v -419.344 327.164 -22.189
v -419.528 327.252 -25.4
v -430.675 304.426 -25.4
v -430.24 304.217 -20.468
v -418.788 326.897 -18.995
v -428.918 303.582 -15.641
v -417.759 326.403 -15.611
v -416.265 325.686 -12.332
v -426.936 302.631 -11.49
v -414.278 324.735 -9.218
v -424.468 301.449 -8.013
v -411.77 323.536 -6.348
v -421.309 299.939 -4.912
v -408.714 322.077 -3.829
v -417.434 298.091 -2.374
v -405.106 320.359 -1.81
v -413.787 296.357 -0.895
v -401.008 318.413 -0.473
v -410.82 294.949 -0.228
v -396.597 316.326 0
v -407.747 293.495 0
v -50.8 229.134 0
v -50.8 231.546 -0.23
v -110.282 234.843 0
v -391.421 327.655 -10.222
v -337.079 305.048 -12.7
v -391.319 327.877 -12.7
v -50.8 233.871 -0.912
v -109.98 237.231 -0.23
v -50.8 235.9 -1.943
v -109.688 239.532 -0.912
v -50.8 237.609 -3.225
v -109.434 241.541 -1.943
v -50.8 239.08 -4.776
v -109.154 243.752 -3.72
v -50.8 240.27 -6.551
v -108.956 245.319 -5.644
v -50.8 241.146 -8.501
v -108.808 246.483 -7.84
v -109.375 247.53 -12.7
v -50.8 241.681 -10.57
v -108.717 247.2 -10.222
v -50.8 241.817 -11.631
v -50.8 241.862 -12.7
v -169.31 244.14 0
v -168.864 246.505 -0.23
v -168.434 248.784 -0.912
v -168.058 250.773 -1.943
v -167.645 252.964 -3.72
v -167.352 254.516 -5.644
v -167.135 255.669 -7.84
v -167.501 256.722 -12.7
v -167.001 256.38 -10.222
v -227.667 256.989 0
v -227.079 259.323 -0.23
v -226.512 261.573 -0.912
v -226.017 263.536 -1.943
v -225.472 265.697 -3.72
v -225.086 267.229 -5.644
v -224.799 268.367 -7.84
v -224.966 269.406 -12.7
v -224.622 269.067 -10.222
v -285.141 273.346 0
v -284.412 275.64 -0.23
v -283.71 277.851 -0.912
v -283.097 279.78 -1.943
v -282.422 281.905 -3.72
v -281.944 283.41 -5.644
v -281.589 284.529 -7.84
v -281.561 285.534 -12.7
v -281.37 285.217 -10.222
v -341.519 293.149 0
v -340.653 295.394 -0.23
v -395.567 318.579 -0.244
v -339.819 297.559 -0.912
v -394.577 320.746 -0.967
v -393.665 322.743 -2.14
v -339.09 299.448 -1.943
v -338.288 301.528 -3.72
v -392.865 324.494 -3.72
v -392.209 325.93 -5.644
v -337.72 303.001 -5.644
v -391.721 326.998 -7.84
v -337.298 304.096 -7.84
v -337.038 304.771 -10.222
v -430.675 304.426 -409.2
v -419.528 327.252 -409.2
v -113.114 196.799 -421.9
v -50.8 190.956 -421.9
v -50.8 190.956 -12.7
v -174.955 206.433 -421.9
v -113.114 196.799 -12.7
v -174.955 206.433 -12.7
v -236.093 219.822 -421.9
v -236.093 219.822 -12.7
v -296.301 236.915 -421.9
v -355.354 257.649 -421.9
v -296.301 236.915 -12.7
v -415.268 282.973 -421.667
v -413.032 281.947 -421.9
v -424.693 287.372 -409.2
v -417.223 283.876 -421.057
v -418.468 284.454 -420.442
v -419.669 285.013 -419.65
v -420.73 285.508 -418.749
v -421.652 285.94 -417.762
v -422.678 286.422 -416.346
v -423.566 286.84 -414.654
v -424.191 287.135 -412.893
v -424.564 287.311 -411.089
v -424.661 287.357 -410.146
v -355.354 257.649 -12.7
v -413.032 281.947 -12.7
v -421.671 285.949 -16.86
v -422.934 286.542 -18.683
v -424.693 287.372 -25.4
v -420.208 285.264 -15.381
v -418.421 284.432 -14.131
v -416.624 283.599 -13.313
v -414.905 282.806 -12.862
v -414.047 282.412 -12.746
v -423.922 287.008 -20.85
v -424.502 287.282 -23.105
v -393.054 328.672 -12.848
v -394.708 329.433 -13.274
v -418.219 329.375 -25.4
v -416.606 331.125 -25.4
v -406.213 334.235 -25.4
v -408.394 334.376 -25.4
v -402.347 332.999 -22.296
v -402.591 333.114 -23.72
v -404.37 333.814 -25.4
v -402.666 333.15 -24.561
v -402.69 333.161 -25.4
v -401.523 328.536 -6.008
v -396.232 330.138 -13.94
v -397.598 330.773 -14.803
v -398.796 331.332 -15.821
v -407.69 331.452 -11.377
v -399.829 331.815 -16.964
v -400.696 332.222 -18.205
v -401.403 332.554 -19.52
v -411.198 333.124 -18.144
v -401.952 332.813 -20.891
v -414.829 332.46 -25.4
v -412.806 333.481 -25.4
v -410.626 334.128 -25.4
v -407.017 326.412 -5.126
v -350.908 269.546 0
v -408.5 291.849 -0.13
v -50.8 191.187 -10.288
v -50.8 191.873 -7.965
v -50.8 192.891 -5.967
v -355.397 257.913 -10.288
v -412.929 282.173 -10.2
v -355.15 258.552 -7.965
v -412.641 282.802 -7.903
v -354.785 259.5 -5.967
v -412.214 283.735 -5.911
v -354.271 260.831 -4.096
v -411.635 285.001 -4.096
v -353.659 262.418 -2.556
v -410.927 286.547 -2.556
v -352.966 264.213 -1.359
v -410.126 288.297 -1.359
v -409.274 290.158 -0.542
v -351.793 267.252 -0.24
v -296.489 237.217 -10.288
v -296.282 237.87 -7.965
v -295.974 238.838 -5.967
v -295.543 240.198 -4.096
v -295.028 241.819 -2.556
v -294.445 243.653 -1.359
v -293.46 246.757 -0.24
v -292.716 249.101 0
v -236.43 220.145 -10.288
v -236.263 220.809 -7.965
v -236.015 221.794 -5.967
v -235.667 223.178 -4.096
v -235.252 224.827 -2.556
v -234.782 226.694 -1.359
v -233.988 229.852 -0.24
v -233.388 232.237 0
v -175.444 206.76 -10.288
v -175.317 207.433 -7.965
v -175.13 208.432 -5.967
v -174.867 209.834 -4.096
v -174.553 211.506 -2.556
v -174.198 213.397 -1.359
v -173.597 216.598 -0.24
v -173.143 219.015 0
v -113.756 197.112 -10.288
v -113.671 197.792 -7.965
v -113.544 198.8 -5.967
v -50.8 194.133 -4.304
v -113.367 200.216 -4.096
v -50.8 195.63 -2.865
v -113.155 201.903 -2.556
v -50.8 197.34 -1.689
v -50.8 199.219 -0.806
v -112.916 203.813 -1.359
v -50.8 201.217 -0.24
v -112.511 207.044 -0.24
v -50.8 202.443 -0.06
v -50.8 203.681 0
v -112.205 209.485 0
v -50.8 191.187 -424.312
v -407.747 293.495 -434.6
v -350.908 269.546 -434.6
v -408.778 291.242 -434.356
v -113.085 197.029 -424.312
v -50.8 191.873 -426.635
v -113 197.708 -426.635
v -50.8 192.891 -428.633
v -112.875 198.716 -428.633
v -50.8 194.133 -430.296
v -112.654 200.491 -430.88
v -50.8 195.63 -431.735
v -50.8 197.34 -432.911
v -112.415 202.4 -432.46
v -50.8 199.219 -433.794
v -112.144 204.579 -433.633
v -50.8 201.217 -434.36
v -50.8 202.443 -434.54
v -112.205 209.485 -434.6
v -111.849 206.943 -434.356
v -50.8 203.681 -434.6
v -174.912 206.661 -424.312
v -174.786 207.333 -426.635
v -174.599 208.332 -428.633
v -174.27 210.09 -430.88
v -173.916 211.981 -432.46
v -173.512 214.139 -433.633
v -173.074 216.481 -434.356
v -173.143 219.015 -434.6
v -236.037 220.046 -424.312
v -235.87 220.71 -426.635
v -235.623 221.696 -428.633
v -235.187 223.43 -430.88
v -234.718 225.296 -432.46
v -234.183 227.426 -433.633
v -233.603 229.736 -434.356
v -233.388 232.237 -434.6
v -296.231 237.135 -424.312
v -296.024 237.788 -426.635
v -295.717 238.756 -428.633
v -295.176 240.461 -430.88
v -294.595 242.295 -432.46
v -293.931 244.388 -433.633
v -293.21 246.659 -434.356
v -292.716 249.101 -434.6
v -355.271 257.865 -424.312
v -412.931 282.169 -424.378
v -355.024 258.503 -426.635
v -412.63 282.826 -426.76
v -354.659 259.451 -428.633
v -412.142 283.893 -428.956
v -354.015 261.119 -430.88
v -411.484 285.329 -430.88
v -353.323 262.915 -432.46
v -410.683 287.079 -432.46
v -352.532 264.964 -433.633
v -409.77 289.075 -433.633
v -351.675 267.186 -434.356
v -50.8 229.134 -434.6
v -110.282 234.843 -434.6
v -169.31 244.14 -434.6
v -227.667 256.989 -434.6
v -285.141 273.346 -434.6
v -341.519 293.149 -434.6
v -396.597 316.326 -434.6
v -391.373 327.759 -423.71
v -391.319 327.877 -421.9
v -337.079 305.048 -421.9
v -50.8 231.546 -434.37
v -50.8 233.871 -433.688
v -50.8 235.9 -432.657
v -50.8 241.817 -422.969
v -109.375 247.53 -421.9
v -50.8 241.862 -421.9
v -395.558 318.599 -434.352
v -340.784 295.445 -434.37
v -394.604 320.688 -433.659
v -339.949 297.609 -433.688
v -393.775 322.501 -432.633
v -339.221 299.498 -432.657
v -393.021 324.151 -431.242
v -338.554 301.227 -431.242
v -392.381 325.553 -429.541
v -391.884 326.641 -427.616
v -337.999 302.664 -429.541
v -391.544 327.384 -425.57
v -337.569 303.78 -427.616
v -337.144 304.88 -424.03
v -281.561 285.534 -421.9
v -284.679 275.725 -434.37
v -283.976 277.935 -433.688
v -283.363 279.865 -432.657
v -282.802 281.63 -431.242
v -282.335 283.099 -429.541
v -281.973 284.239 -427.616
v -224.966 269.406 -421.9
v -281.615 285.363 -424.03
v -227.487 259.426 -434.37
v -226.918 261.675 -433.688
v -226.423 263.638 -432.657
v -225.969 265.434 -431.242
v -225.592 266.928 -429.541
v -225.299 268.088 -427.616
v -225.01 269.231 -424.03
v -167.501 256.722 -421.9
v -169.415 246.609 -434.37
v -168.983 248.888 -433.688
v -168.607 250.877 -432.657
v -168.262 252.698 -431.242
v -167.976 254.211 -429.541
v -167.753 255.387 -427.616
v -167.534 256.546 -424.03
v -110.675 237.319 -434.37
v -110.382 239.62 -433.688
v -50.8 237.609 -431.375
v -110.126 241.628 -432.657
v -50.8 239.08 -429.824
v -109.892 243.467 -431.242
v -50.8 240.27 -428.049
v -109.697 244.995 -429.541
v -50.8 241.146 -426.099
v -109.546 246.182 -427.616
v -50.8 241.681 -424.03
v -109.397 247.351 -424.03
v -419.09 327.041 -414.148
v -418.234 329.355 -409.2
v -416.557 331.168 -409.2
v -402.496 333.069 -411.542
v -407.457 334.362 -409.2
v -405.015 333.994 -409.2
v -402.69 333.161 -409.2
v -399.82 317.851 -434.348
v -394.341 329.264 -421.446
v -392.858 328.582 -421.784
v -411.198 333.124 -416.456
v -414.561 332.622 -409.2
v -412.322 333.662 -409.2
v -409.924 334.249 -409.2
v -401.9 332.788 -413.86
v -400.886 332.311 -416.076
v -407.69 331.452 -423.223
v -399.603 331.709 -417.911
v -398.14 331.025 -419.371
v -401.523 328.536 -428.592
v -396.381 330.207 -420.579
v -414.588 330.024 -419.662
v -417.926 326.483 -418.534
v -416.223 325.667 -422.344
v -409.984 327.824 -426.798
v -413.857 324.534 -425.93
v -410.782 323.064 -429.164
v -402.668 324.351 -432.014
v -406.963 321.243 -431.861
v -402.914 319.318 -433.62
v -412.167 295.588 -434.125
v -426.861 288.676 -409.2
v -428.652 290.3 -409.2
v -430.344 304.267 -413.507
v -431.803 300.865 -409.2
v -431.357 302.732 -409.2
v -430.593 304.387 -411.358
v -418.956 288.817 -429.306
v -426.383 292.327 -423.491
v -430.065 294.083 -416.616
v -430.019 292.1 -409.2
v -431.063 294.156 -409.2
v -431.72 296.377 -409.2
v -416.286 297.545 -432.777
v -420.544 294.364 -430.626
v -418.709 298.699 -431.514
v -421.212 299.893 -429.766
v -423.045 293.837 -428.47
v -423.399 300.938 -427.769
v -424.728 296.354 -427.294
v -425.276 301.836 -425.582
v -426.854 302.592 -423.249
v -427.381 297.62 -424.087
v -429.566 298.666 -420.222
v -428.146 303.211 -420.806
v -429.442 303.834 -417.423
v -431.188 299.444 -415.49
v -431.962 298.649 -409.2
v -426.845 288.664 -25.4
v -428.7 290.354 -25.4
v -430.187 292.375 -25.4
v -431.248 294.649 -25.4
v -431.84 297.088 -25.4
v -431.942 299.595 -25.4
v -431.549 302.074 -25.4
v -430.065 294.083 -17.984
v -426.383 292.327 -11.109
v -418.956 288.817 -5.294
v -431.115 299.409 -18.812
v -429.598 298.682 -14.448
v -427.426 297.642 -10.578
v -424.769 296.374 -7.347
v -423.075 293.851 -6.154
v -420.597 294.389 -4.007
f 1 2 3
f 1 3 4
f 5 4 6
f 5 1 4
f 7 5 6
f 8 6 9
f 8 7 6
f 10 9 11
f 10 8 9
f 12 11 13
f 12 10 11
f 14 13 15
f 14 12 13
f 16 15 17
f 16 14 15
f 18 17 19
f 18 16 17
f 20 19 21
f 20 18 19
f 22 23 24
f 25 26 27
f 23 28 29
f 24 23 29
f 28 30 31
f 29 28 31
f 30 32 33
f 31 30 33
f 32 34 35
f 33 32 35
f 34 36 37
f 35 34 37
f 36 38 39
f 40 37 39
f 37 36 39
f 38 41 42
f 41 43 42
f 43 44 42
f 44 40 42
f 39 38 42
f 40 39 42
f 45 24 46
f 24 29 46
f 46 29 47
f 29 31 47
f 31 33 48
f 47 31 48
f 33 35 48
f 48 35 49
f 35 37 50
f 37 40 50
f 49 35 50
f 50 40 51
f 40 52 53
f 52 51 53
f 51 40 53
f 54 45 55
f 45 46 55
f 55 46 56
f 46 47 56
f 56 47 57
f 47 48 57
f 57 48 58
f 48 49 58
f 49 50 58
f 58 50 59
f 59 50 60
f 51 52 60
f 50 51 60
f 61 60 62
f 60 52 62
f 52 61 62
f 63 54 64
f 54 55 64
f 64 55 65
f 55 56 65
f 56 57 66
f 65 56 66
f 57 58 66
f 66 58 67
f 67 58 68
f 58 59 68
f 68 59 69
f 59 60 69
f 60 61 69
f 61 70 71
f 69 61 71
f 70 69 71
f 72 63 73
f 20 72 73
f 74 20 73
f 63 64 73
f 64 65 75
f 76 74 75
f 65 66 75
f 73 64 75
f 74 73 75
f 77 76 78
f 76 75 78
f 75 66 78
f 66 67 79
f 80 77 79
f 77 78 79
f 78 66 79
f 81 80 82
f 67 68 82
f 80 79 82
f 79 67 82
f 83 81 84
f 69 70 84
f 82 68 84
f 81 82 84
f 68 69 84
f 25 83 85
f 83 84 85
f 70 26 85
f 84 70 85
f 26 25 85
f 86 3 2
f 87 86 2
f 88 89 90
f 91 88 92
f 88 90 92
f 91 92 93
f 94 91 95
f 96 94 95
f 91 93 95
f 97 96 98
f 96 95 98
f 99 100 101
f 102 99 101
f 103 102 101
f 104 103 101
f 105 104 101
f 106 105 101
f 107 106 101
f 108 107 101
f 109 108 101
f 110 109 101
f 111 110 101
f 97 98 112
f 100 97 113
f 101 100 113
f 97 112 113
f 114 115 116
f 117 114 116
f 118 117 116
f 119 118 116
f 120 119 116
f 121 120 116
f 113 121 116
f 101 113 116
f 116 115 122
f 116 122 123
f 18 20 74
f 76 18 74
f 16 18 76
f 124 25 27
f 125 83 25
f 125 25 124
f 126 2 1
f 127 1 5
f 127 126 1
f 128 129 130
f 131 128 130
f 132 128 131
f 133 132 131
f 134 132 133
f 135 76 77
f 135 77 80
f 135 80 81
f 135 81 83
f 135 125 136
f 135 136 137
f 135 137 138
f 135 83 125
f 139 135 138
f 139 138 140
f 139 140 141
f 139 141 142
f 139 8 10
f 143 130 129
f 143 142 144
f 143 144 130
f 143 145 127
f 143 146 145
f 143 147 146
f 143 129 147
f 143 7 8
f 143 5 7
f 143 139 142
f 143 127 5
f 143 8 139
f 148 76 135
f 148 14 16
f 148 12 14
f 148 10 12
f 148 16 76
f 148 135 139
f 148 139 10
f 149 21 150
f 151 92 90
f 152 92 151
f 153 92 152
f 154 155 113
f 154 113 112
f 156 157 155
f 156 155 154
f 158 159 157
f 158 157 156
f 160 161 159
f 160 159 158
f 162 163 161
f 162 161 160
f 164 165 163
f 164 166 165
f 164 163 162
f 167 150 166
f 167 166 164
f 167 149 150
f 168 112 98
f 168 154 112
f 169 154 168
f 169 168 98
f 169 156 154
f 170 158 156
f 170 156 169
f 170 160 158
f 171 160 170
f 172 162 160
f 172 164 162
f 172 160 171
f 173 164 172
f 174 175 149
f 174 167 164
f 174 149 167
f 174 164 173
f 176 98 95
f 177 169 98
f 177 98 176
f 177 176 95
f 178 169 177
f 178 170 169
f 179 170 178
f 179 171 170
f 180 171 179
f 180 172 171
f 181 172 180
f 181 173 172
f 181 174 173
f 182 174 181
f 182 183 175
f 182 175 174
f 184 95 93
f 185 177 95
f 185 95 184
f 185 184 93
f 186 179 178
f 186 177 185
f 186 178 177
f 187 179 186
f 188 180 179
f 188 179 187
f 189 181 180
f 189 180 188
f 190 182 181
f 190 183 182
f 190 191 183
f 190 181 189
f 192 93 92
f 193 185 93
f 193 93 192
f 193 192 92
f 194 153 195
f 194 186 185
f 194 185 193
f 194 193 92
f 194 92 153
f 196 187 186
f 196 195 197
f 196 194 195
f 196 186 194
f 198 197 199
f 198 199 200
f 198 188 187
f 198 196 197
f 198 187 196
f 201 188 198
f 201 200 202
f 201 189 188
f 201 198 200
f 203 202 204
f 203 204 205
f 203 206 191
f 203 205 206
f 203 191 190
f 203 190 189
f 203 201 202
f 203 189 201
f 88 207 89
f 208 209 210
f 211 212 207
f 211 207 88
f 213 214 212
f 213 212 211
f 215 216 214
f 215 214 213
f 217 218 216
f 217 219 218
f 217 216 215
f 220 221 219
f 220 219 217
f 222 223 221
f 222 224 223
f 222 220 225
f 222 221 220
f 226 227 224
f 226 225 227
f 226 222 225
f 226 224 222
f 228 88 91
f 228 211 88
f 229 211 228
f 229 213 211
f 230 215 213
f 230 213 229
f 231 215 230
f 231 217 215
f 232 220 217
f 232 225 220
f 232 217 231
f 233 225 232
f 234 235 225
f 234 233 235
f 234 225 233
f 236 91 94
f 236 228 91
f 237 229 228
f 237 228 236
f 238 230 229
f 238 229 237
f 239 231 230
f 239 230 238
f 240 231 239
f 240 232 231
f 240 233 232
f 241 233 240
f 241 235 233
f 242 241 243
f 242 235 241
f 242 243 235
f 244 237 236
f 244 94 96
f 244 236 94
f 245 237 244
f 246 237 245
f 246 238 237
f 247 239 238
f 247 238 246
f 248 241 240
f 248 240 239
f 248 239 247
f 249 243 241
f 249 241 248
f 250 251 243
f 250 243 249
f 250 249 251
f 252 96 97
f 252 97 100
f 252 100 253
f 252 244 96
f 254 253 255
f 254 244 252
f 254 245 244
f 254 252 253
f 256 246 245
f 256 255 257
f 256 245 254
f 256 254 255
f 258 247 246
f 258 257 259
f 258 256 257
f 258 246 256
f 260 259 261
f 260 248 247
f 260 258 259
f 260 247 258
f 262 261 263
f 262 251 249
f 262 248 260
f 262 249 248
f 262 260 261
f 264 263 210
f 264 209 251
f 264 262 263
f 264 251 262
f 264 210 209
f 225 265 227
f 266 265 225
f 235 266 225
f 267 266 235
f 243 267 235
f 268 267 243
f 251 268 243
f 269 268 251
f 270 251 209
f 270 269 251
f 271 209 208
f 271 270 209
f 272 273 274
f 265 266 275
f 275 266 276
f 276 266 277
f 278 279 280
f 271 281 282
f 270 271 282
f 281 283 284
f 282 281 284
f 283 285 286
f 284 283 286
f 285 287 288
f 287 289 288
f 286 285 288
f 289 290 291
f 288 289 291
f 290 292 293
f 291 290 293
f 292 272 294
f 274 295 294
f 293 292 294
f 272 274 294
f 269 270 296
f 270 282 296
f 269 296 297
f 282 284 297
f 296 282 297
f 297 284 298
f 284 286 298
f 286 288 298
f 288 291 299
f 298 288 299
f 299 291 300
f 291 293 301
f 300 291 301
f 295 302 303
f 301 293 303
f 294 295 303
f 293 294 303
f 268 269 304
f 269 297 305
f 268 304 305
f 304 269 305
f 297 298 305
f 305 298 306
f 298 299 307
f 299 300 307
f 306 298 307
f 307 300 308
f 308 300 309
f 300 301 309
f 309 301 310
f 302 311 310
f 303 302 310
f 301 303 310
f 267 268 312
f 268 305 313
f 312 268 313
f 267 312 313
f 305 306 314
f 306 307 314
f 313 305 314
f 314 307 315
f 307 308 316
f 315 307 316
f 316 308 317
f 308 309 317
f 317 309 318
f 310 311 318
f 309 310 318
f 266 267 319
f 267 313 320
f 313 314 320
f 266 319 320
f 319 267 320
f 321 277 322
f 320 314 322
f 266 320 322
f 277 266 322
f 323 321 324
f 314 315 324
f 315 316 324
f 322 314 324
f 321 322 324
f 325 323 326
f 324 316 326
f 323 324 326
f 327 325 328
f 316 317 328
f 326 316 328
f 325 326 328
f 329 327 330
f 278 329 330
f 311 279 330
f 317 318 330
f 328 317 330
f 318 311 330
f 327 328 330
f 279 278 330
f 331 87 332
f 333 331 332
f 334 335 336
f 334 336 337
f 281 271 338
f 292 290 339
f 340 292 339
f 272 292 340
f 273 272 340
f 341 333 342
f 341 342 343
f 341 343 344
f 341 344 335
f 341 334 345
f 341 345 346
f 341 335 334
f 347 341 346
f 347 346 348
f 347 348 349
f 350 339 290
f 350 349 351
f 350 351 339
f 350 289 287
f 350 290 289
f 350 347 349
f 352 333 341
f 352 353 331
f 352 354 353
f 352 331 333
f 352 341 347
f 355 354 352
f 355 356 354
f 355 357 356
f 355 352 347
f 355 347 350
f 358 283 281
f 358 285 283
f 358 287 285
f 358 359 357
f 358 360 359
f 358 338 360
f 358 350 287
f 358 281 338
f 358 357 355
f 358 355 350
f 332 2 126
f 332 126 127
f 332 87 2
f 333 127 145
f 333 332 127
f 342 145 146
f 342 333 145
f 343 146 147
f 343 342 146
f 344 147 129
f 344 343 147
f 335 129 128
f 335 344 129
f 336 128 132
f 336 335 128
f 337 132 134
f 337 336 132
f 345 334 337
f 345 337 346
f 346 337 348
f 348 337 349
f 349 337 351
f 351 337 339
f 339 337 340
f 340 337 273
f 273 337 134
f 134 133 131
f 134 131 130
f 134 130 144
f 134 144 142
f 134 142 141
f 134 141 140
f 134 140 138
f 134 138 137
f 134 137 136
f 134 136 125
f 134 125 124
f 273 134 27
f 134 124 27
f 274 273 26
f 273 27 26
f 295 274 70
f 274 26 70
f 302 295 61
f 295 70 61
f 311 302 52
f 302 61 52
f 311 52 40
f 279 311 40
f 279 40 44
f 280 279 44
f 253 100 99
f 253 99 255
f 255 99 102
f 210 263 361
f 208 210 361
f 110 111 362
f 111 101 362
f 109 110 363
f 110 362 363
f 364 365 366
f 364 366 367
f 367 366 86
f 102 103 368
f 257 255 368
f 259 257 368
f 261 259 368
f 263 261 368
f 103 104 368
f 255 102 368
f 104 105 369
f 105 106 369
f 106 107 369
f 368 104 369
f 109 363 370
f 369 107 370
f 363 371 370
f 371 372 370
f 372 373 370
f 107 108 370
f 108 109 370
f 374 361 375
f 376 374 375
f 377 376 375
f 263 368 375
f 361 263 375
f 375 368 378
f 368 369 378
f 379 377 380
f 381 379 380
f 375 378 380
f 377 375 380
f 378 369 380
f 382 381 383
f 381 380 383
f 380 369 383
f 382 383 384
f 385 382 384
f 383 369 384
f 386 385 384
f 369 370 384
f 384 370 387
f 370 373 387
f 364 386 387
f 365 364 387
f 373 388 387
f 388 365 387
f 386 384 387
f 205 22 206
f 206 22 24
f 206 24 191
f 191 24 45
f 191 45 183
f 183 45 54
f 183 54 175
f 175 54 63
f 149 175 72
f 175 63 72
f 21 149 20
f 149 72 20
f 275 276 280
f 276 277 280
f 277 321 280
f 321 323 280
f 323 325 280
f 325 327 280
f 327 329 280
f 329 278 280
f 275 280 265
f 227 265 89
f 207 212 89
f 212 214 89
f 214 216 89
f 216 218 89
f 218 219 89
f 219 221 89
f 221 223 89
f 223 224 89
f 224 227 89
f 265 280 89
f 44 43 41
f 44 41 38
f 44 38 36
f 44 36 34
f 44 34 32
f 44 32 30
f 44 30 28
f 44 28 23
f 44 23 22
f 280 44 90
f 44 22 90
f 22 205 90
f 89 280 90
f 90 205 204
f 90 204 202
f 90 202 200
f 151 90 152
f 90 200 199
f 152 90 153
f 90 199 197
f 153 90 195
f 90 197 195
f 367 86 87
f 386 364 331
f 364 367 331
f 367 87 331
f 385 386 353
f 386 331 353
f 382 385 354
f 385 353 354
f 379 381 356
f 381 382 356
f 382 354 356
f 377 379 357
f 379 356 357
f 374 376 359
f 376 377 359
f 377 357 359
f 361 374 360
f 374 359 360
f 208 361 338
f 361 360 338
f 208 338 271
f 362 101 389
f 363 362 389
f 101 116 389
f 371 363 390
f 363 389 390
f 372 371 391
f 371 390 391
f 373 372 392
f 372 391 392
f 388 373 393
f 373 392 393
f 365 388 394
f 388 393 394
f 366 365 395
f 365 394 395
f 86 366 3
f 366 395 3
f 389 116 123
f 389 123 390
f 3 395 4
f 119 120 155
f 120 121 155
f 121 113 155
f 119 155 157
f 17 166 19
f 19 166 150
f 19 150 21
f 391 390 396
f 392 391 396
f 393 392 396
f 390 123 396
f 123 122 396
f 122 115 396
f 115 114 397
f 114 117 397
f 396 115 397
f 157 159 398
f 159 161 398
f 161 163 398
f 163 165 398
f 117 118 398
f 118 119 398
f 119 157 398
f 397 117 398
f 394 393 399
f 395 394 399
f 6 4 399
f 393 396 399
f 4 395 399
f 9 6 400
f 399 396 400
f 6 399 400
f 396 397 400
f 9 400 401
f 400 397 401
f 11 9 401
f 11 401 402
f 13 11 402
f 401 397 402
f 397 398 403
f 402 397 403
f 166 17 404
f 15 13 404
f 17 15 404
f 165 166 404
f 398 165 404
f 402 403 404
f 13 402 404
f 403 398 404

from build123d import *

# Parameters (mm, degrees)
BOSS_EXTRUDE1_DEPTH = 434.6
FILLET1_R           = 25.4
FILLET2_R           = 12.7


with BuildPart() as part:
    # Sketch1 → Boss-Extrude1 (new body)
    with BuildSketch(Plane.XY):
        with BuildLine():
            Line((-50.8, 241.861797239), (-50.8, 190.955582052))
            ThreePointArc((-50.8, 190.955582052), (-248.54641158, 223.033274611), (-436.283591965, 292.943021812))
            Line((-436.283591965, 292.943021812), (-413.99080623, 338.590274786))
            ThreePointArc((-413.99080623, 338.590274786), (-237.101828879, 272.554605518), (-50.8, 241.861797239))
        make_face()
    extrude(amount=-BOSS_EXTRUDE1_DEPTH)

    # Fillet1
    fillet1_edges = [part.edges().sort_by_distance(p)[0] for p in [
        (-425.137199097, 315.766648299, -434.6),
        (-425.137199097, 315.766648299, 0),
    ]]
    fillet(fillet1_edges, radius=FILLET1_R)

    # Fillet2
    fillet2_edges = [part.edges().sort_by_distance(p)[0] for p in [
        (-236.247784218, 219.860784348, -434.6),
        (-236.247784218, 219.860784348, 0),
        (-436.283591965, 292.943021812, -217.3),
        (-429.586107636, 289.70220341, -427.161351846),
        (-429.586107636, 289.70220341, -7.438648154),
        (-413.99080623, 338.590274786, -217.3),
        (-224.807276662, 269.365840187, -434.6),
        (-407.292621944, 335.350680861, -427.161443503),
        (-407.292621944, 335.350680861, -7.438556497),
        (-224.807276662, 269.365840187, 0),
    ]]
    fillet(fillet2_edges, radius=FILLET2_R)


solid = part.part
